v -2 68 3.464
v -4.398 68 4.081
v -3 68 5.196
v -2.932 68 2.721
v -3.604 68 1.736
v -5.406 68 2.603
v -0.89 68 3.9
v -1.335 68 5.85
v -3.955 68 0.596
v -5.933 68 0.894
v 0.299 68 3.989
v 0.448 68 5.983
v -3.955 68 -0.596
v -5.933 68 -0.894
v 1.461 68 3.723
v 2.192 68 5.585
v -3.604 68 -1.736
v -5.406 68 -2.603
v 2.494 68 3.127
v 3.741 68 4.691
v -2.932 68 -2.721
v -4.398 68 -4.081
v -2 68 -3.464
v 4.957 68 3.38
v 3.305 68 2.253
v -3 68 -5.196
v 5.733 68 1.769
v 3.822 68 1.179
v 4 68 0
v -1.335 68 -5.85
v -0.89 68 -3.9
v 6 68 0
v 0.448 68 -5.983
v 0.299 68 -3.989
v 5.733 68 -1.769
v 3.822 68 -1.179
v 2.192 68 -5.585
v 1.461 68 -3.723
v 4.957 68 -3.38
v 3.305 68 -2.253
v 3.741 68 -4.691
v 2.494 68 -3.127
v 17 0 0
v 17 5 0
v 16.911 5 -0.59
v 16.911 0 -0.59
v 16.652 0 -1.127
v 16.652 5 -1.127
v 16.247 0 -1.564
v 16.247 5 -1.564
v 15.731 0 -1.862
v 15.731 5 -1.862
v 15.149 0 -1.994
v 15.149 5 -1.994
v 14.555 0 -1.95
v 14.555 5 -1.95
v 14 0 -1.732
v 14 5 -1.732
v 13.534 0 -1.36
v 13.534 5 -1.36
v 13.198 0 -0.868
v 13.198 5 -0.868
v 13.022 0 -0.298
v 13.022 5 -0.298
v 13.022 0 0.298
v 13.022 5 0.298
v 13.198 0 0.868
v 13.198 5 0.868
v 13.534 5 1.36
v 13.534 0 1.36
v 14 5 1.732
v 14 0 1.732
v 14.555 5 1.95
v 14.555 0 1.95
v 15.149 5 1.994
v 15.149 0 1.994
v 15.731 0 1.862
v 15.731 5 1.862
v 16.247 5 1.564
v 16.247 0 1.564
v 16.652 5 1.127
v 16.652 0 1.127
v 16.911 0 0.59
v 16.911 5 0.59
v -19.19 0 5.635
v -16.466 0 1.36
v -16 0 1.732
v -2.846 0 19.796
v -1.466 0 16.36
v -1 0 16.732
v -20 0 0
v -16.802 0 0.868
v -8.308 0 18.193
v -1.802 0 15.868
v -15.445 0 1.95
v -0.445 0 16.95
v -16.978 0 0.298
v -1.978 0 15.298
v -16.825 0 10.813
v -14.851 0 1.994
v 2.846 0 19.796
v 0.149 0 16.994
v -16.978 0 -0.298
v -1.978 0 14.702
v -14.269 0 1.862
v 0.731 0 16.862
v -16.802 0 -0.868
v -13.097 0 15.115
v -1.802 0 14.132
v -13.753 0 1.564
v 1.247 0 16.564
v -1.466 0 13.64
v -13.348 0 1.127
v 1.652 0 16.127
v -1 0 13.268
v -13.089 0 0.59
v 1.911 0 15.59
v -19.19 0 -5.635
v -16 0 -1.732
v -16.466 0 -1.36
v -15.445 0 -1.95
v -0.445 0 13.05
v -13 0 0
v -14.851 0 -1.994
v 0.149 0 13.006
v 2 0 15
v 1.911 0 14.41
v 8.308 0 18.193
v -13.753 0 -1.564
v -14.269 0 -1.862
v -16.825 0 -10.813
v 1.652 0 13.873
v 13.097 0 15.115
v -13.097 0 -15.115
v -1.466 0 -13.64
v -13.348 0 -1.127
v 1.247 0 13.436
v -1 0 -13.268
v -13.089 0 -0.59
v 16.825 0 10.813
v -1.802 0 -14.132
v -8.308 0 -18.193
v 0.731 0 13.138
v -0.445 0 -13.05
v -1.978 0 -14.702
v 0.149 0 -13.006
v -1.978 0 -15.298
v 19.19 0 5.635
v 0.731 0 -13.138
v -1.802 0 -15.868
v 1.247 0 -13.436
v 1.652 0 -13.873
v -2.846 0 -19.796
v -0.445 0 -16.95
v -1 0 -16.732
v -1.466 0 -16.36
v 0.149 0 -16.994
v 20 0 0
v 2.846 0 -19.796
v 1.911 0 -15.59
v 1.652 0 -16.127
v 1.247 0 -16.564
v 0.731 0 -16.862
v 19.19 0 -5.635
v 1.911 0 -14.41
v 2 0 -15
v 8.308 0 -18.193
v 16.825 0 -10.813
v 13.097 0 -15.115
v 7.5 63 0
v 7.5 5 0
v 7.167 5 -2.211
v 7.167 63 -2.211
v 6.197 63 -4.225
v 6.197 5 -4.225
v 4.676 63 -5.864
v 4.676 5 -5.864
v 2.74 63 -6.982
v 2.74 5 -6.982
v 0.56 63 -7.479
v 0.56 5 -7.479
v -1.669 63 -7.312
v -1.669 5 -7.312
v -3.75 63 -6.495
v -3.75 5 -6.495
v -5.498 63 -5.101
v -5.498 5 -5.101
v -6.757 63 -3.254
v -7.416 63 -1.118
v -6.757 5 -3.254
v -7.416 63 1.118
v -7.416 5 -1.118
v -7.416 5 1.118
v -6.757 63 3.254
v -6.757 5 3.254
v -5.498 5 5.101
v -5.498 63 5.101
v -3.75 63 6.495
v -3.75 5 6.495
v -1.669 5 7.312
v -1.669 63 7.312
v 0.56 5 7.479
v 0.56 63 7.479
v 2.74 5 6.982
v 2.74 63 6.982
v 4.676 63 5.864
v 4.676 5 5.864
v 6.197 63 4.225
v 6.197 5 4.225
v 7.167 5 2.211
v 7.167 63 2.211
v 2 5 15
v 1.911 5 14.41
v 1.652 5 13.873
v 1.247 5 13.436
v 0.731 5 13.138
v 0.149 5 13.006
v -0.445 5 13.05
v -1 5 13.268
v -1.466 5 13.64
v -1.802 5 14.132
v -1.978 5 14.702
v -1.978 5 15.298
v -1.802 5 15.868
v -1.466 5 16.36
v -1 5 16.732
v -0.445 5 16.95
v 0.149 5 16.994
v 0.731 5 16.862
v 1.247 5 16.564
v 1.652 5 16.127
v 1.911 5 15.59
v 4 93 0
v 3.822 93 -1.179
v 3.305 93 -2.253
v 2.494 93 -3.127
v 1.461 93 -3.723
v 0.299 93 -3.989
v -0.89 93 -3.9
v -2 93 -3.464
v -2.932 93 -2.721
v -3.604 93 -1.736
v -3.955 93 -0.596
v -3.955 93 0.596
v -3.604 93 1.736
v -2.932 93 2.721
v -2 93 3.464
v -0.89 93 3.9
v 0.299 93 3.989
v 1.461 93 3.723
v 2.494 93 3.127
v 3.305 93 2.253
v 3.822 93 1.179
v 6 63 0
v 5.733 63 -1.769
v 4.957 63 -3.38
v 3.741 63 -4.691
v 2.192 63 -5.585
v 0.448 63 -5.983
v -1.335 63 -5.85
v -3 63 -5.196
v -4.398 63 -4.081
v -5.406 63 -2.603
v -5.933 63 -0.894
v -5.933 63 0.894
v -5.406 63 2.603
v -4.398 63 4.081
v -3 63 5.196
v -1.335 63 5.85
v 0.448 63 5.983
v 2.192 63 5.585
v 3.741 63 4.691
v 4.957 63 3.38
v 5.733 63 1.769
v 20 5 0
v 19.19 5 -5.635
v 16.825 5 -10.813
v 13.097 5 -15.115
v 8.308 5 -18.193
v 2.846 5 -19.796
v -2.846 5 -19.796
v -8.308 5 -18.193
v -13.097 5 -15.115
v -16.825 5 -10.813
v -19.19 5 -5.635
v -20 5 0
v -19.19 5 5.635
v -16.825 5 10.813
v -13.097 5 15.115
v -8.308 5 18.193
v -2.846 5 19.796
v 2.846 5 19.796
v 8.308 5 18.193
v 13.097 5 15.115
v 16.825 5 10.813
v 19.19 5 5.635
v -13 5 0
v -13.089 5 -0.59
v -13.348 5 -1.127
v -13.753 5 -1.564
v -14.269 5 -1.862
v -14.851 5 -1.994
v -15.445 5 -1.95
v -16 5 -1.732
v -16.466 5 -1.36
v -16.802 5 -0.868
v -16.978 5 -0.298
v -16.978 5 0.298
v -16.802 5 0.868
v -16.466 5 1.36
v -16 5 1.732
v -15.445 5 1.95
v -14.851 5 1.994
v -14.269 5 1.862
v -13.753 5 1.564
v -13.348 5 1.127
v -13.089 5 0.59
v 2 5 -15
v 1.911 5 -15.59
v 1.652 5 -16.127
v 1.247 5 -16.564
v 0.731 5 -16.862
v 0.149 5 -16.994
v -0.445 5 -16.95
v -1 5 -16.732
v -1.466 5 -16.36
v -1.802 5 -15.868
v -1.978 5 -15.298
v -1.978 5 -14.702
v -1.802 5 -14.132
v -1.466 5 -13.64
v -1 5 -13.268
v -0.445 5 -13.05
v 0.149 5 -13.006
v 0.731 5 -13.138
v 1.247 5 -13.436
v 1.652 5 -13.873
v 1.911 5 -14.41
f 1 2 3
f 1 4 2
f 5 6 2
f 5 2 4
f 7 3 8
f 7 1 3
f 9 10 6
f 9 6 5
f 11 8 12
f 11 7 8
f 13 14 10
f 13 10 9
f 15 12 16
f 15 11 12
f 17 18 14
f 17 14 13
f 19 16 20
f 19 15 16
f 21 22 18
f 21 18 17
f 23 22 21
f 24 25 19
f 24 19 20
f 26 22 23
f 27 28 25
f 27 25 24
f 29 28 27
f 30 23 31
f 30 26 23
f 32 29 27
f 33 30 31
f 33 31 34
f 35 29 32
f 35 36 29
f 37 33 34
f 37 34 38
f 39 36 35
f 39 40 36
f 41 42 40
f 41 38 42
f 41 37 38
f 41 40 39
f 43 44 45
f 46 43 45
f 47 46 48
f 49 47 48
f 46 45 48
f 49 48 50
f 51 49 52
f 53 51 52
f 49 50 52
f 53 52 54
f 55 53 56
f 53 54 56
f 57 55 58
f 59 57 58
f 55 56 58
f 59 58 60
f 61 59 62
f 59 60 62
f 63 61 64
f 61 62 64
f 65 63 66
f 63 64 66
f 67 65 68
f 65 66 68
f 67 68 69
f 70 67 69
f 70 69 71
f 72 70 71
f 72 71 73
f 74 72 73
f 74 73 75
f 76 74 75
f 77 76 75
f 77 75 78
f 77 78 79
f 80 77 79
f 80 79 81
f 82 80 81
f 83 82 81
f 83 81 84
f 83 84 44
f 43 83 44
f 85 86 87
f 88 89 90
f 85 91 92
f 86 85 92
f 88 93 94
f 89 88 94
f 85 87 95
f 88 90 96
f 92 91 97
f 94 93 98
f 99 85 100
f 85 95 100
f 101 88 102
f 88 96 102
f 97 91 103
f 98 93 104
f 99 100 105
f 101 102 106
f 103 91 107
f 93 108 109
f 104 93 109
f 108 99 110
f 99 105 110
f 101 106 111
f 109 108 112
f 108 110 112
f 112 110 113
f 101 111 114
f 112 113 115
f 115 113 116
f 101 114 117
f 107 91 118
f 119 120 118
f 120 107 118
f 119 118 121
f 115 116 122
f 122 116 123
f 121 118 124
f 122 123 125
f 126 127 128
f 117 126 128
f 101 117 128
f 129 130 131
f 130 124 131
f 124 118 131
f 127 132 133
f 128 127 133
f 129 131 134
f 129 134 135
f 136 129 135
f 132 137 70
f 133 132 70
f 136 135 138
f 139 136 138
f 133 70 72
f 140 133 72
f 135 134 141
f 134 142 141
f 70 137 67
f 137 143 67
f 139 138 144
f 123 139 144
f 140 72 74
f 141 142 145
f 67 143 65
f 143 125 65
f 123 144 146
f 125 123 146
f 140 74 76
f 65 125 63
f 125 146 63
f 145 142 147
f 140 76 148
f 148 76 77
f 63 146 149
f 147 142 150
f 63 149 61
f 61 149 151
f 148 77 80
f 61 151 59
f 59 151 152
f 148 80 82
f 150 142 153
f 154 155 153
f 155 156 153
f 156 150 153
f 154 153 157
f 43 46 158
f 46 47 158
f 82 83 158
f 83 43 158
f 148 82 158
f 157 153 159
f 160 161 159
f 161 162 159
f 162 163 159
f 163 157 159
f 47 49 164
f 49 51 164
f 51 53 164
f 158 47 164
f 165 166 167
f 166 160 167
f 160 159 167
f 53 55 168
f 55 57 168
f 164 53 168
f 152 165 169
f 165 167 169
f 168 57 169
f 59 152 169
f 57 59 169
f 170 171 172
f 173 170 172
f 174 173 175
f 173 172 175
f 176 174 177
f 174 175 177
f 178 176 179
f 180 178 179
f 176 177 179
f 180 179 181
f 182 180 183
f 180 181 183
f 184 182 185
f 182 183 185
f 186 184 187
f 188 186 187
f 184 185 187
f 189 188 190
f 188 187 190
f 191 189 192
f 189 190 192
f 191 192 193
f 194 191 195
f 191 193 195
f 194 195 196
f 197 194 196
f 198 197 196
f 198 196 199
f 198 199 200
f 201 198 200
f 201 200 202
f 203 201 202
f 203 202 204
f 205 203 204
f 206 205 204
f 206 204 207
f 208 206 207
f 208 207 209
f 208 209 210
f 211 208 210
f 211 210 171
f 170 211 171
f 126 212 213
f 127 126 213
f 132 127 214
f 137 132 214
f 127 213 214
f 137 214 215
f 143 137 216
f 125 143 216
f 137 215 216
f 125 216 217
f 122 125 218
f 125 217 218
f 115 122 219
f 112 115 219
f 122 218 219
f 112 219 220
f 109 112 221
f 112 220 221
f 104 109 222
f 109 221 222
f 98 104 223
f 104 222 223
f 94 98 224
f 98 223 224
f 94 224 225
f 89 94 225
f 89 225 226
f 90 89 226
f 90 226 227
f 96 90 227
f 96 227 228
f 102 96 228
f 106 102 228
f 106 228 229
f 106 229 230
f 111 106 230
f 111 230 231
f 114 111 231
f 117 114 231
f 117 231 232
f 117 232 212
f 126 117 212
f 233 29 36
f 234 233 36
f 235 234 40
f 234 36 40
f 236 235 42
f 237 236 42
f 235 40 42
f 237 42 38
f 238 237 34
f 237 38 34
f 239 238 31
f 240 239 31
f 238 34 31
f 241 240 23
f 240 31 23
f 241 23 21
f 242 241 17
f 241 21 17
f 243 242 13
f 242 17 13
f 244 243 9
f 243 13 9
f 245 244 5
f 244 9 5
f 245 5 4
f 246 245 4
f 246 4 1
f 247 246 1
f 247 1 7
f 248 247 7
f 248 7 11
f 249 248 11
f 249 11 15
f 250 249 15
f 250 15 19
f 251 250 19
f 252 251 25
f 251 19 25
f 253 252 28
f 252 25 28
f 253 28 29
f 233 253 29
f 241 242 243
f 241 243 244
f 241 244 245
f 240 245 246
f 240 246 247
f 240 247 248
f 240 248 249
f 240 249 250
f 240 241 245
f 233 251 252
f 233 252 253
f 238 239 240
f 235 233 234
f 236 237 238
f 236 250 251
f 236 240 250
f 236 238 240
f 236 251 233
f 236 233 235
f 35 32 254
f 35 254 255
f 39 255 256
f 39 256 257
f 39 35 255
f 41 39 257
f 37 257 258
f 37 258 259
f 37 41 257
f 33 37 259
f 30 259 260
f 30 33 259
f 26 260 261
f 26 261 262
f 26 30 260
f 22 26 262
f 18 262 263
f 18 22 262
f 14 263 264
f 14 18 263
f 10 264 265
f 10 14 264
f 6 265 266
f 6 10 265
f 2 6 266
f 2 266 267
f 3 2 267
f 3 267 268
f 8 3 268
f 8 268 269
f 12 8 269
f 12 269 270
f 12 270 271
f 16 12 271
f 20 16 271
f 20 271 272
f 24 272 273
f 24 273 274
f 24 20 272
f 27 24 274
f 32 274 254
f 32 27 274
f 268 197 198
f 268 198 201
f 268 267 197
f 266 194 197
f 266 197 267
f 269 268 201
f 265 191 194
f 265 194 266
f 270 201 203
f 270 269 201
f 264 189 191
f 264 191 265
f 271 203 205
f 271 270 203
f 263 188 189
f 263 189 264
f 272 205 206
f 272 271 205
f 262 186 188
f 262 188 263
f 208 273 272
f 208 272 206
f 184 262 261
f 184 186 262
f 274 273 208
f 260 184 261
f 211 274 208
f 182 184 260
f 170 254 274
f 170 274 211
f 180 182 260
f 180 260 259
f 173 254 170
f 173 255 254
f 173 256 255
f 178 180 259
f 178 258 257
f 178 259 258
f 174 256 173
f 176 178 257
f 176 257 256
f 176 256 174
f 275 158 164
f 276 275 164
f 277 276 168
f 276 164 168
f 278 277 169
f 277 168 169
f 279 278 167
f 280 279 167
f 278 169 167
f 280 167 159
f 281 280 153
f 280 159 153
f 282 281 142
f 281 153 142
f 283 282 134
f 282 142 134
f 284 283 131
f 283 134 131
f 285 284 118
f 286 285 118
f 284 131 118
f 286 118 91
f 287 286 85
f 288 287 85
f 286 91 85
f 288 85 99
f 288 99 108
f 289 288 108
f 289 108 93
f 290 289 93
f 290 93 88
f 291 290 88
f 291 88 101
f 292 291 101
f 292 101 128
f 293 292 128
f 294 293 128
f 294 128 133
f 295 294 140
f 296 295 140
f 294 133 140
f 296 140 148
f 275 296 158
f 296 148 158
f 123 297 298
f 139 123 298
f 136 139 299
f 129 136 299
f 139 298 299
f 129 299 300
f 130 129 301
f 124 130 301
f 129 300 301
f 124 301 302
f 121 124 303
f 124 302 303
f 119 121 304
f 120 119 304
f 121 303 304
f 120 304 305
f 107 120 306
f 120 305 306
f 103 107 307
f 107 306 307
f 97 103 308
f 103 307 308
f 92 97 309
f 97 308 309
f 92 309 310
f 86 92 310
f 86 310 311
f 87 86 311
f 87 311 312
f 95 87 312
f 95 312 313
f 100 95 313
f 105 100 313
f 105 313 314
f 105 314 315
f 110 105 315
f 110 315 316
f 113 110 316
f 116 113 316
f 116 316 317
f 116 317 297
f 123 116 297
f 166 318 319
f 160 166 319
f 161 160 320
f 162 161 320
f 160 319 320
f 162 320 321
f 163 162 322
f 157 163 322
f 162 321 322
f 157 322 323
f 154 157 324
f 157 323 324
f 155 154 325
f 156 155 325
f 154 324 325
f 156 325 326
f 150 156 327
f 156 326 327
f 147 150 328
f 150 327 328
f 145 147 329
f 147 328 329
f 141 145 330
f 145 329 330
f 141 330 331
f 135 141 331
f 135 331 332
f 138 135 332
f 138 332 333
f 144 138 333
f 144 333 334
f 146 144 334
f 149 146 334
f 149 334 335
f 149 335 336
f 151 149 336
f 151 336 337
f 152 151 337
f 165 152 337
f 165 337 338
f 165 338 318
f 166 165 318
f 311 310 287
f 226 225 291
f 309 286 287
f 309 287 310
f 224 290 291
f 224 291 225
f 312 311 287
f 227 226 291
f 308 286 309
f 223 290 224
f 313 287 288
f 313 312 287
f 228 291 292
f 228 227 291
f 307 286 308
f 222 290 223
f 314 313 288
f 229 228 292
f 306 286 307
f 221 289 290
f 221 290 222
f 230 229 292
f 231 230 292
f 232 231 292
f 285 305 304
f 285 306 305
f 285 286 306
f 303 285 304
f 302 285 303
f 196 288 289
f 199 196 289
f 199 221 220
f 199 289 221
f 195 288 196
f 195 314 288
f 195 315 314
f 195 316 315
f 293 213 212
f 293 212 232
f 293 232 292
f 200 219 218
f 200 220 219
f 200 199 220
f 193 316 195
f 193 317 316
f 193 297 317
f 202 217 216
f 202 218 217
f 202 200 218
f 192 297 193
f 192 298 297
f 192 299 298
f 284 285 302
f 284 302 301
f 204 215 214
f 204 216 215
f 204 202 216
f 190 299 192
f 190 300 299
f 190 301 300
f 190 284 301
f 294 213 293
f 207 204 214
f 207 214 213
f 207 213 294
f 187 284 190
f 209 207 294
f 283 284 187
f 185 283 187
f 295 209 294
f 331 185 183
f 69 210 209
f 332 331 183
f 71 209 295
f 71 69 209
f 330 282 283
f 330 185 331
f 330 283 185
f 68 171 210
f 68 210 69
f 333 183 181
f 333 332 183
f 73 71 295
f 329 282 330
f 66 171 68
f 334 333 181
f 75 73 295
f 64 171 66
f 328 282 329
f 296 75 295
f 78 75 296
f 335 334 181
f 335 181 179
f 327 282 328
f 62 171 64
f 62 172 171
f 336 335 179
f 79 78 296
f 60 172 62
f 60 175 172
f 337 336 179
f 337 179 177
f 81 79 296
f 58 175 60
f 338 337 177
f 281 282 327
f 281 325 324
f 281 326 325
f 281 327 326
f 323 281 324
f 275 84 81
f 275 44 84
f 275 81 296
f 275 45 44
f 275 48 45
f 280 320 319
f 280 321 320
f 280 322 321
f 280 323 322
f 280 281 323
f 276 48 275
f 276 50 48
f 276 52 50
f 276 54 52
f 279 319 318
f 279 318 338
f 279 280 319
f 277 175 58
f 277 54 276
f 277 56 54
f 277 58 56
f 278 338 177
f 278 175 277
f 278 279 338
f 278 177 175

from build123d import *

# Parameters (mm, degrees)
SKETCH1_R           = 20
BOSS_EXTRUDE1_DEPTH = 5
SKETCH2_R           = 7.5
BOSS_EXTRUDE2_DEPTH = 63
SKETCH3_R           = 4
BOSS_EXTRUDE3_DEPTH = 25
SKETCH4_R           = 2
CUT_EXTRUDE1_DEPTH  = 25
SKETCH5_R           = 7.5
SKETCH5_R_2         = 6
CUT_EXTRUDE2_DEPTH  = 5


with BuildPart() as part:
    # Sketch1 → Boss-Extrude1 (new body)
    with BuildSketch(Plane(origin=(0, 0, 0), x_dir=(1, 0, 0), z_dir=(0, 1, 0))):
        Circle(SKETCH1_R)
    extrude(amount=BOSS_EXTRUDE1_DEPTH)

    # Sketch2 → Boss-Extrude2 (add)
    with BuildSketch(Plane(origin=(0, 5, 0), x_dir=(1, 0, 0), z_dir=(0, 1, 0))):
        Circle(SKETCH2_R)
    extrude(amount=BOSS_EXTRUDE2_DEPTH)

    # Sketch3 → Boss-Extrude3 (add)
    with BuildSketch(Plane(origin=(0, 68, 0), x_dir=(1, 0, 0), z_dir=(0, 1, 0))):
        Circle(SKETCH3_R)
    extrude(amount=BOSS_EXTRUDE3_DEPTH)

    # Sketch4 → Cut-Extrude1 (cut)
    with BuildSketch(Plane(origin=(0, 5, 0), x_dir=(1, 0, 0), z_dir=(0, 1, 0))):
        with Locations((0, 15)):
            Circle(SKETCH4_R)
        with Locations((15, 0)):
            Circle(SKETCH4_R)
        with Locations((0, -15)):
            Circle(SKETCH4_R)
        with Locations((-15, 0)):
            Circle(SKETCH4_R)
    extrude(amount=-CUT_EXTRUDE1_DEPTH, mode=Mode.SUBTRACT)

    # Sketch5 → Cut-Extrude2 (cut)
    with BuildSketch(Plane(origin=(0, 68, 0), x_dir=(1, 0, 0), z_dir=(0, 1, 0))):
        Circle(SKETCH5_R)
        Circle(SKETCH5_R_2, mode=Mode.SUBTRACT)
    extrude(amount=-CUT_EXTRUDE2_DEPTH, mode=Mode.SUBTRACT)


solid = part.part
